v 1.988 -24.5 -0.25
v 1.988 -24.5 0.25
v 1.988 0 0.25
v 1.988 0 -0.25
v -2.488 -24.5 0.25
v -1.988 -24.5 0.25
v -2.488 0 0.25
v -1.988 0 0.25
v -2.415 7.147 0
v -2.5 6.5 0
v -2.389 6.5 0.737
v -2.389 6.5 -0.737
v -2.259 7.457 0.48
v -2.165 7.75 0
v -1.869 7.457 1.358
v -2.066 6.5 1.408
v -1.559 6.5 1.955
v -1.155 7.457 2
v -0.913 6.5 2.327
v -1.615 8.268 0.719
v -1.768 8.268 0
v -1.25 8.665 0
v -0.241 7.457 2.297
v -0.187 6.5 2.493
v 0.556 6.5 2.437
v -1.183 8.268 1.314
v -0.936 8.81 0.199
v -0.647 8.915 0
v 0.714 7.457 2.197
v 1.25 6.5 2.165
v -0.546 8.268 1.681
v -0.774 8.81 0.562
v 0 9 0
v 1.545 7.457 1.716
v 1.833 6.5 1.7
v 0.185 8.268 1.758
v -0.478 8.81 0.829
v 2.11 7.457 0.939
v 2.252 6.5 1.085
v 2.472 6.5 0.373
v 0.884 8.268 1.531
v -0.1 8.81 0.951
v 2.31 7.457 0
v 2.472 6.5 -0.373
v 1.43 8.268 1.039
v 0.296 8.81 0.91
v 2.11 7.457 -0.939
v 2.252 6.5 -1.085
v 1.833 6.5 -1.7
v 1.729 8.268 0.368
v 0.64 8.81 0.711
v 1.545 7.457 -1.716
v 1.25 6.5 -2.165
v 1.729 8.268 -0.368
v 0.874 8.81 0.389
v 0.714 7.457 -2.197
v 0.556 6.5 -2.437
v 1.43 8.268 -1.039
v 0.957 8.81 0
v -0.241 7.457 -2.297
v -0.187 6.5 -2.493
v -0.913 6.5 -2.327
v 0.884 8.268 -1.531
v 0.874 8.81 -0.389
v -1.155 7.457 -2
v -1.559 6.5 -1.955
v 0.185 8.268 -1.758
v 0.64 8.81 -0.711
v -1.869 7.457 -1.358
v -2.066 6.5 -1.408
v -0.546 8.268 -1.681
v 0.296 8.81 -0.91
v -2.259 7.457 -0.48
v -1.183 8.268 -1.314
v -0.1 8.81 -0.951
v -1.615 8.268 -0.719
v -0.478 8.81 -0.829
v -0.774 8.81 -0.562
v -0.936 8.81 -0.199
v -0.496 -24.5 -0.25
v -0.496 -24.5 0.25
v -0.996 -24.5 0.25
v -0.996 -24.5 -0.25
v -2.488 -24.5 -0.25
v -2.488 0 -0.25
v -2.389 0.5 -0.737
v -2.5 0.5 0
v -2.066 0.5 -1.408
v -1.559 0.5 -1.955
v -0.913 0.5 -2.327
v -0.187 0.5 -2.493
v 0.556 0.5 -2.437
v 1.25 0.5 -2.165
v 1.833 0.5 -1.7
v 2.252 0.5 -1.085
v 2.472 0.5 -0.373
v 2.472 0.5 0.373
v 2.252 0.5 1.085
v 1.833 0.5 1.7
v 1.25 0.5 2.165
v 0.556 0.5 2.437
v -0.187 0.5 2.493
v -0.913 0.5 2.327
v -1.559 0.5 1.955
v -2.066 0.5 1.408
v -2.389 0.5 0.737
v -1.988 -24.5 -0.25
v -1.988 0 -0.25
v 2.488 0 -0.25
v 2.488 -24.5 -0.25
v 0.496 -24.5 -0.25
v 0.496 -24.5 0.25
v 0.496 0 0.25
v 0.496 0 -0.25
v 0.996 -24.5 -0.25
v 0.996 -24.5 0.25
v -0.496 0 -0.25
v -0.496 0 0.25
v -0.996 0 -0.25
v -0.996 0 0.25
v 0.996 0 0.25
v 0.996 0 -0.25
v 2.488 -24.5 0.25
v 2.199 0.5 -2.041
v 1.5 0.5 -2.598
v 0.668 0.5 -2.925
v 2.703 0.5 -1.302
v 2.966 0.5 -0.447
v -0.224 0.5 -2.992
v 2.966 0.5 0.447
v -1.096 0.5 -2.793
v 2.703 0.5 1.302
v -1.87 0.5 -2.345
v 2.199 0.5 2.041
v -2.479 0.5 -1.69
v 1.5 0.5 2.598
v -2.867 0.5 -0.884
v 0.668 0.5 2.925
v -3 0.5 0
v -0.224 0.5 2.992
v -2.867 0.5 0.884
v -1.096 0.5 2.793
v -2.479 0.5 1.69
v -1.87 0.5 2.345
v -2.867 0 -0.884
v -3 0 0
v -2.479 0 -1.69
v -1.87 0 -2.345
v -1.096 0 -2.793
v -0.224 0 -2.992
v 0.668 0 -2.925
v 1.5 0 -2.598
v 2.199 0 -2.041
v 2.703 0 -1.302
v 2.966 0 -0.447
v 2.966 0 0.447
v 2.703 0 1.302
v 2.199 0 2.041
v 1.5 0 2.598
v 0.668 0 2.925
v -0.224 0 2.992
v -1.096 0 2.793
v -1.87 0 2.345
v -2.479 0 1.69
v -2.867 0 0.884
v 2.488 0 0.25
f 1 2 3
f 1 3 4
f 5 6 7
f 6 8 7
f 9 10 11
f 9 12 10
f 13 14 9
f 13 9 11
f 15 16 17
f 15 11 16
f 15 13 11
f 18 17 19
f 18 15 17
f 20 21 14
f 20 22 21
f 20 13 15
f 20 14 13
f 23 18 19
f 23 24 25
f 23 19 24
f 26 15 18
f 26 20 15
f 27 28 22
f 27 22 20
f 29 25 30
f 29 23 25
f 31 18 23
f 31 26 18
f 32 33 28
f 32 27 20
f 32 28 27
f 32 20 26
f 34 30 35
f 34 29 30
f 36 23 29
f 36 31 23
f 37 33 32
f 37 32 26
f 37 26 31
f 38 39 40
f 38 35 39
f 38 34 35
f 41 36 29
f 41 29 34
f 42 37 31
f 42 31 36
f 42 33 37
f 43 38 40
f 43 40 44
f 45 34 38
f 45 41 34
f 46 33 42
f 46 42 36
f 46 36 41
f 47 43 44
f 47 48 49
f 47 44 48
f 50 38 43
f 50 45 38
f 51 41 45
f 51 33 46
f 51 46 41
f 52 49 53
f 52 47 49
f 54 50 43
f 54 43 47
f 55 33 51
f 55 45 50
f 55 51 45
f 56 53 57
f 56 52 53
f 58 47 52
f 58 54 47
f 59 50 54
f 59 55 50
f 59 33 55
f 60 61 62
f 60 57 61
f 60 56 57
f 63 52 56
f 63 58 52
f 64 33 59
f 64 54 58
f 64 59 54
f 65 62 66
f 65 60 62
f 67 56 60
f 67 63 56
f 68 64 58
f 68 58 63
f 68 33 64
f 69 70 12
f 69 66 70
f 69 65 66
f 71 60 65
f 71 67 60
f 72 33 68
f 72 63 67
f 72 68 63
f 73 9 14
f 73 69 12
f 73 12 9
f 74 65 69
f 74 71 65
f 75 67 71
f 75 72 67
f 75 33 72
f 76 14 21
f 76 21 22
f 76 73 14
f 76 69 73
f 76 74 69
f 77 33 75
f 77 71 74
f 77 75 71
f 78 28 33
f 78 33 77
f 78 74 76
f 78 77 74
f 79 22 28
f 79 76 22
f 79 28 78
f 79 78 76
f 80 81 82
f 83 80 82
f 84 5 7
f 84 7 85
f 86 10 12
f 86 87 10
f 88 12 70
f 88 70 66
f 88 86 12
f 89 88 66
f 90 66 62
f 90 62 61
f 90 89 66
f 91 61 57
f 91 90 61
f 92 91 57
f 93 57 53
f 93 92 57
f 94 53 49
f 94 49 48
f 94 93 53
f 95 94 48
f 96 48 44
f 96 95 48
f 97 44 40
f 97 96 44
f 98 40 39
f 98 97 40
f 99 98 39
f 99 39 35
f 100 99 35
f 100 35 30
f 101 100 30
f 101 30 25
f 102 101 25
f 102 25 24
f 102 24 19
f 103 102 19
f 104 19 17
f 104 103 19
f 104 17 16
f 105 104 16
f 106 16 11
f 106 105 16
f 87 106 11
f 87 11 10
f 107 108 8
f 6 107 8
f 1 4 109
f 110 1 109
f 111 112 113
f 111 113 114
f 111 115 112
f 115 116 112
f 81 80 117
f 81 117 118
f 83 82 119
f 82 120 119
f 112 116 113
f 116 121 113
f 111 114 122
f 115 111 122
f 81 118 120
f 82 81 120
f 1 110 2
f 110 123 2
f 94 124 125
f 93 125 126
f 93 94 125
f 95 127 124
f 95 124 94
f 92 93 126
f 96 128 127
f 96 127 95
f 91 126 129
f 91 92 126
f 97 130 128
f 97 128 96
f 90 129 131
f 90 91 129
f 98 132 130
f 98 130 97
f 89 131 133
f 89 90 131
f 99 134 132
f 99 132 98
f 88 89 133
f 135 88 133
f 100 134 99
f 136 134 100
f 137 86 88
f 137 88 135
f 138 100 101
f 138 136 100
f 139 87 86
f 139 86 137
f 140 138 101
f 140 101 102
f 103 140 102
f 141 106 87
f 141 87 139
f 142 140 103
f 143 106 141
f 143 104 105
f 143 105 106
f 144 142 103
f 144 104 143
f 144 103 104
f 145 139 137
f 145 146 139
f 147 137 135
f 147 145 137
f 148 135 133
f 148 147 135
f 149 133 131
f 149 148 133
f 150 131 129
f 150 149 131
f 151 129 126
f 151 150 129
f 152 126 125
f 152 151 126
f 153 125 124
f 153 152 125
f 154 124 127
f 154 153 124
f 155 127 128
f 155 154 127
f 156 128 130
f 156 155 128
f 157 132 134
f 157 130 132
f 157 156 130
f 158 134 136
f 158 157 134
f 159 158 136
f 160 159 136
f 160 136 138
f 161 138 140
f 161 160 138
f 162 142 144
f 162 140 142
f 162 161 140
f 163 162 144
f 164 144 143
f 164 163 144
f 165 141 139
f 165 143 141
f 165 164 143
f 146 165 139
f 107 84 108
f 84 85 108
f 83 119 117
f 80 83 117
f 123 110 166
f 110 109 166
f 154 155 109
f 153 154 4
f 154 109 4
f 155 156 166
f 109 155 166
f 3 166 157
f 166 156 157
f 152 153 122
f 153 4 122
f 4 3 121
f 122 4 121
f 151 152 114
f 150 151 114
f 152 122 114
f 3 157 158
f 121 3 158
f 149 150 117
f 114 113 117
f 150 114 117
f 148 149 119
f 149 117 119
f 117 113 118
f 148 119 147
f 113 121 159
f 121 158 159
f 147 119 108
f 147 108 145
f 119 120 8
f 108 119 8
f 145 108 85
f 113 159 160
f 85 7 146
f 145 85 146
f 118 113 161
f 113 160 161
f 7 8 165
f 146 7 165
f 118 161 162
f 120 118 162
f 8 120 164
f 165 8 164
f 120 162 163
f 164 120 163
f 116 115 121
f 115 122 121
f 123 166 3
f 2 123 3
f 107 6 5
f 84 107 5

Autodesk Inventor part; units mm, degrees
ref_plane "YZ Plane" through (0, 0, 0) normal (1, 0, 0) x (0, 1, 0)
ref_plane "XZ Plane" through (0, 0, 0) normal (0, 1, 0) x (-1, 0, 0)
ref_plane "XY Plane" through (0, 0, 0) normal (0, 0, 1) x (1, 0, 0)
sketch "Sketch1" plane through (0, 0, 0) normal (0, 1, 0) x (-1, 0, 0)
  circle A0 centre (0, 0) radius 2.5
  circle A1 centre (0, 0) radius 3
  line L0 (1.9875, 0.25) -> (2.4875, 0.25)
  line L1 (2.4875, 0.25) -> (2.4875, -0.25)
  line L2 (2.4875, -0.25) -> (1.9875, -0.25)
  line L3 (1.9875, -0.25) -> (1.9875, 0.25)
  line L4 (1.9875, 0.25) -> (2.4875, -0.25) construction
  line L5 (2.4875, 0.25) -> (1.9875, -0.25) construction
  line L6 (2.5, 0) -> (-2.5, 0)
  line L7 (0.9958, 0.25) -> (0.9958, -0.25)
  line L8 (0.4958, 0.25) -> (0.9958, 0.25)
  line L9 (0.4958, -0.25) -> (0.4958, 0.25)
  line L10 (0.9958, -0.25) -> (0.4958, -0.25)
  line L11 (0.9958, 0.25) -> (0.4958, -0.25) construction
  line L12 (0.4958, 0.25) -> (0.9958, -0.25) construction
  line L13 (-0.4958, 0.25) -> (-0.4958, -0.25)
  line L14 (-0.9958, 0.25) -> (-0.4958, 0.25)
  line L15 (-0.9958, -0.25) -> (-0.9958, 0.25)
  line L16 (-0.4958, -0.25) -> (-0.9958, -0.25)
  line L17 (-0.4958, 0.25) -> (-0.9958, -0.25) construction
  line L18 (-0.9958, 0.25) -> (-0.4958, -0.25) construction
  line L19 (-1.9875, 0.25) -> (-1.9875, -0.25)
  line L20 (-2.4875, 0.25) -> (-1.9875, 0.25)
  line L21 (-2.4875, -0.25) -> (-2.4875, 0.25)
  line L22 (-1.9875, -0.25) -> (-2.4875, -0.25)
  line L23 (-1.9875, 0.25) -> (-2.4875, -0.25) construction
  line L24 (-2.4875, 0.25) -> (-1.9875, -0.25) construction
  point P0 (1.6583, 2.5)
  point P1 (-1.6583, 2.5)
  point P2 (2.2375, 0)
  point P3 (0.7458, 0)
  point P4 (-0.7458, 0)
  point P5 (-2.2375, 0)
  dimension "d11" = 5
  dimension "d12" = 0.5
  dimension "d22" = 1.4916
extrude "Extrusion3" add sketch "Sketch1" along normal blind 9 contours L6 L1 A0 | A0 L1 L6 | L0 L3 L6 L7 L8 L9 L13 L14 L15 L19 L20 A0 | L1 L6 L3 L0 | L2 L3 L6 L1 | A0 L22 L19 L6 L15 L16 L13 L9 L10 L7 L3 L2 | L21 L6 A0 | L20 L19 L6 L21 | A0 L6 L21 | L21 L6 L19 L22 | L7 L10 L9 L6 | L6 L9 L8 L7 | L15 L14 L13 L6 | L6 L13 L16 L15
extrude "Extrusion4" add sketch "Sketch1" along normal blind 0.5
fillet "Fillet2" radius 2.5 1 edges at (2.5, 9, 0)
extrude "Extrusion5" add sketch "Sketch1" against normal blind 24.5 contours L1 L6 L3 L0 | L2 L3 L6 L1 | L20 L19 L6 L21 | L21 L6 L19 L22 | L7 L10 L9 L6 | L6 L9 L8 L7 | L15 L14 L13 L6 | L6 L13 L16 L15
properties part number "ESP32_C3_SM" material "ABS Plastic"
